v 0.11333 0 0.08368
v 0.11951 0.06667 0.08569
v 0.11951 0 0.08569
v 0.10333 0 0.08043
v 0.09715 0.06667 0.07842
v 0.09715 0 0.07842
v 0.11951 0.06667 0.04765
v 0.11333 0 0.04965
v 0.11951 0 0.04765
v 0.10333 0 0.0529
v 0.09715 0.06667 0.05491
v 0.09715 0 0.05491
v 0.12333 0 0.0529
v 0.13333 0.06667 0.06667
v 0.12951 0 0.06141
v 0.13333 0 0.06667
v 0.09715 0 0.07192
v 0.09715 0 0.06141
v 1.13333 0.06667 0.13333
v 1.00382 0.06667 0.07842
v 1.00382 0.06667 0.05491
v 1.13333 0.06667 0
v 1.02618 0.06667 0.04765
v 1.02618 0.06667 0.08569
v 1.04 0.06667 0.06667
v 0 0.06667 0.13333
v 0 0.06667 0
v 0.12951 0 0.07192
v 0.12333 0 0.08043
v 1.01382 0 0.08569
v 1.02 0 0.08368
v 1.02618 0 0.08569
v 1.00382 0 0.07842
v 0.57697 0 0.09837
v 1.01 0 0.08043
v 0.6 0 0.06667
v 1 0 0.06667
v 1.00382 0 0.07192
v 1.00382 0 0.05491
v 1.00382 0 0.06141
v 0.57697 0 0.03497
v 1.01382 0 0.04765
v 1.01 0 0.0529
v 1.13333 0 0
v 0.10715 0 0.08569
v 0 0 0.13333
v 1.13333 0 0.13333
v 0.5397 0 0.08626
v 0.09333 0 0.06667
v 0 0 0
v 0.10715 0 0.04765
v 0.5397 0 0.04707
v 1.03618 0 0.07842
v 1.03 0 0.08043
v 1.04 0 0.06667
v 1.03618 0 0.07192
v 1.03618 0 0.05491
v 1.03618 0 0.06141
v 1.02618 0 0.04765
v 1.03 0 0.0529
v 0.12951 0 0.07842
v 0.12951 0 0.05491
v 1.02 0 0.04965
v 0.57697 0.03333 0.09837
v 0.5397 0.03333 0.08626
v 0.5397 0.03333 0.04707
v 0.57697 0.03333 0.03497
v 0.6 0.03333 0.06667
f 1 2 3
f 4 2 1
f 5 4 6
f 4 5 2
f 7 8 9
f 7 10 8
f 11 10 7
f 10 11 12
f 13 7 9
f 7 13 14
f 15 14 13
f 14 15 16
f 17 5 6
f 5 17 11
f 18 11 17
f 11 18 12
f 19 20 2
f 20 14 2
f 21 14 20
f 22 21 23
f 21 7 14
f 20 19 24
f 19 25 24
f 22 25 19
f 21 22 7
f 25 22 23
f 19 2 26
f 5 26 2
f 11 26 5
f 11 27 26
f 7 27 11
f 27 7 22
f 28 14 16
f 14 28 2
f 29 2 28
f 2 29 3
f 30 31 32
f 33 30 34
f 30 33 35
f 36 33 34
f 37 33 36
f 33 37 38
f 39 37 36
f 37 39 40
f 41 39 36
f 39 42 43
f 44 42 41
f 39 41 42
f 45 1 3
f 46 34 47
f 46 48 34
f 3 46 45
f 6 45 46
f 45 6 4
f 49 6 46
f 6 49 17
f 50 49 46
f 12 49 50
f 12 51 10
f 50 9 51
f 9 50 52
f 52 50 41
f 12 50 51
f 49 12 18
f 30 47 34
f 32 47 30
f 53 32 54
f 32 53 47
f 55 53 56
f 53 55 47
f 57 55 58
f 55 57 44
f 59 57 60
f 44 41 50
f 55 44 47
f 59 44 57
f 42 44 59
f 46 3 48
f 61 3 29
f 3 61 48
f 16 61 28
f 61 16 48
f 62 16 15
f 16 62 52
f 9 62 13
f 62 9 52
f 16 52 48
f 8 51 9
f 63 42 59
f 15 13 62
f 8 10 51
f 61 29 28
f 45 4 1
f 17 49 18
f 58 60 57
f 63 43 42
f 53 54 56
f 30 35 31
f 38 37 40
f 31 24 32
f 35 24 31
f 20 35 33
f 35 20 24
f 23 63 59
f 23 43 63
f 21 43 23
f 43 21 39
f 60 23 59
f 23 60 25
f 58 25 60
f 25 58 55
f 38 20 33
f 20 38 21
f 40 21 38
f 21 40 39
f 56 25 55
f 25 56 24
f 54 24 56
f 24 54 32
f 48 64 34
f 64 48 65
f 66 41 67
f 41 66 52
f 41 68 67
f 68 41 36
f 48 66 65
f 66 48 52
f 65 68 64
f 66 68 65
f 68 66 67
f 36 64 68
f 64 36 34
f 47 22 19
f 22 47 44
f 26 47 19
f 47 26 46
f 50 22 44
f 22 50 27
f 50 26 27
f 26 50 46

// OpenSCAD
// file: defs.scad
SCALE = 150;
forever = 1000/SCALE;
model_threads = 0;
apply_mold = 1;

inside_width = 130/SCALE;
short_wall_thickness = 20/SCALE;
tall_wall_thickness = 20/SCALE;
outside_width = inside_width + short_wall_thickness*2;
depth = 20/SCALE;
slab_shortener = 4/SCALE;
slab_wall = depth/2;
slab_protrusion = 1.25/SCALE;
hole_rad = 2/SCALE;
ptol = 1/SCALE;

short_wall_l = outside_width;
tall_wall_l = outside_width;

slab_thickness = depth/2;
slab_l = short_wall_l;
slab_thickness = depth/2;
linear_rod_offset = slab_l/10;
linear_bearing_outside_r = 3/SCALE;
linear_bearing_inside_r = 1.5/SCALE;
bearing_outside_r = 5/SCALE;
bearing_inside_r = 2.5/SCALE;
bearing_depth = 5/SCALE;

slabx_o = 20/SCALE;
slaby_o = 15/SCALE;


pin_z = 150/SCALE;
pin_x = 2/SCALE;
matrix_pad = 15/SCALE;
pin_pad = 0.0000/SCALE;
// main file
include <defs.scad>

module make_slab()
{
    cube([slab_l, slab_thickness, depth]);
}

module make_linear_hole()
{
    rotate([-90,0,0]) cylinder(slab_thickness,linear_bearing_outside_r,linear_bearing_outside_r);
    // infinite hole
    rotate([-90,0,180]) cylinder(forever,linear_bearing_outside_r,linear_bearing_outside_r);
}
module make_bearing_insert()
{
    rotate([-90,0,0]) cylinder(bearing_depth,bearing_outside_r,bearing_outside_r);
    // infinite hole
    rotate([-90,0,180]) cylinder(forever,bearing_inside_r+0.2/SCALE,bearing_inside_r+0.2/SCALE);
}


module make_slab_holes()
{
    translate([linear_rod_offset,0,depth/2])
    {
        if ($children > 0) children(0);
    }
    translate([slab_l - linear_rod_offset,0,depth/2])
    {
        if ($children > 2) children(2);
    }
    translate([slab_l/2,0,depth/2])
    {
        if ($children > 1) children(1);
    }
}

difference()
{
    make_slab();
    make_slab_holes()
    {
        make_linear_hole();
        make_bearing_insert();
        make_linear_hole();
    }
}
